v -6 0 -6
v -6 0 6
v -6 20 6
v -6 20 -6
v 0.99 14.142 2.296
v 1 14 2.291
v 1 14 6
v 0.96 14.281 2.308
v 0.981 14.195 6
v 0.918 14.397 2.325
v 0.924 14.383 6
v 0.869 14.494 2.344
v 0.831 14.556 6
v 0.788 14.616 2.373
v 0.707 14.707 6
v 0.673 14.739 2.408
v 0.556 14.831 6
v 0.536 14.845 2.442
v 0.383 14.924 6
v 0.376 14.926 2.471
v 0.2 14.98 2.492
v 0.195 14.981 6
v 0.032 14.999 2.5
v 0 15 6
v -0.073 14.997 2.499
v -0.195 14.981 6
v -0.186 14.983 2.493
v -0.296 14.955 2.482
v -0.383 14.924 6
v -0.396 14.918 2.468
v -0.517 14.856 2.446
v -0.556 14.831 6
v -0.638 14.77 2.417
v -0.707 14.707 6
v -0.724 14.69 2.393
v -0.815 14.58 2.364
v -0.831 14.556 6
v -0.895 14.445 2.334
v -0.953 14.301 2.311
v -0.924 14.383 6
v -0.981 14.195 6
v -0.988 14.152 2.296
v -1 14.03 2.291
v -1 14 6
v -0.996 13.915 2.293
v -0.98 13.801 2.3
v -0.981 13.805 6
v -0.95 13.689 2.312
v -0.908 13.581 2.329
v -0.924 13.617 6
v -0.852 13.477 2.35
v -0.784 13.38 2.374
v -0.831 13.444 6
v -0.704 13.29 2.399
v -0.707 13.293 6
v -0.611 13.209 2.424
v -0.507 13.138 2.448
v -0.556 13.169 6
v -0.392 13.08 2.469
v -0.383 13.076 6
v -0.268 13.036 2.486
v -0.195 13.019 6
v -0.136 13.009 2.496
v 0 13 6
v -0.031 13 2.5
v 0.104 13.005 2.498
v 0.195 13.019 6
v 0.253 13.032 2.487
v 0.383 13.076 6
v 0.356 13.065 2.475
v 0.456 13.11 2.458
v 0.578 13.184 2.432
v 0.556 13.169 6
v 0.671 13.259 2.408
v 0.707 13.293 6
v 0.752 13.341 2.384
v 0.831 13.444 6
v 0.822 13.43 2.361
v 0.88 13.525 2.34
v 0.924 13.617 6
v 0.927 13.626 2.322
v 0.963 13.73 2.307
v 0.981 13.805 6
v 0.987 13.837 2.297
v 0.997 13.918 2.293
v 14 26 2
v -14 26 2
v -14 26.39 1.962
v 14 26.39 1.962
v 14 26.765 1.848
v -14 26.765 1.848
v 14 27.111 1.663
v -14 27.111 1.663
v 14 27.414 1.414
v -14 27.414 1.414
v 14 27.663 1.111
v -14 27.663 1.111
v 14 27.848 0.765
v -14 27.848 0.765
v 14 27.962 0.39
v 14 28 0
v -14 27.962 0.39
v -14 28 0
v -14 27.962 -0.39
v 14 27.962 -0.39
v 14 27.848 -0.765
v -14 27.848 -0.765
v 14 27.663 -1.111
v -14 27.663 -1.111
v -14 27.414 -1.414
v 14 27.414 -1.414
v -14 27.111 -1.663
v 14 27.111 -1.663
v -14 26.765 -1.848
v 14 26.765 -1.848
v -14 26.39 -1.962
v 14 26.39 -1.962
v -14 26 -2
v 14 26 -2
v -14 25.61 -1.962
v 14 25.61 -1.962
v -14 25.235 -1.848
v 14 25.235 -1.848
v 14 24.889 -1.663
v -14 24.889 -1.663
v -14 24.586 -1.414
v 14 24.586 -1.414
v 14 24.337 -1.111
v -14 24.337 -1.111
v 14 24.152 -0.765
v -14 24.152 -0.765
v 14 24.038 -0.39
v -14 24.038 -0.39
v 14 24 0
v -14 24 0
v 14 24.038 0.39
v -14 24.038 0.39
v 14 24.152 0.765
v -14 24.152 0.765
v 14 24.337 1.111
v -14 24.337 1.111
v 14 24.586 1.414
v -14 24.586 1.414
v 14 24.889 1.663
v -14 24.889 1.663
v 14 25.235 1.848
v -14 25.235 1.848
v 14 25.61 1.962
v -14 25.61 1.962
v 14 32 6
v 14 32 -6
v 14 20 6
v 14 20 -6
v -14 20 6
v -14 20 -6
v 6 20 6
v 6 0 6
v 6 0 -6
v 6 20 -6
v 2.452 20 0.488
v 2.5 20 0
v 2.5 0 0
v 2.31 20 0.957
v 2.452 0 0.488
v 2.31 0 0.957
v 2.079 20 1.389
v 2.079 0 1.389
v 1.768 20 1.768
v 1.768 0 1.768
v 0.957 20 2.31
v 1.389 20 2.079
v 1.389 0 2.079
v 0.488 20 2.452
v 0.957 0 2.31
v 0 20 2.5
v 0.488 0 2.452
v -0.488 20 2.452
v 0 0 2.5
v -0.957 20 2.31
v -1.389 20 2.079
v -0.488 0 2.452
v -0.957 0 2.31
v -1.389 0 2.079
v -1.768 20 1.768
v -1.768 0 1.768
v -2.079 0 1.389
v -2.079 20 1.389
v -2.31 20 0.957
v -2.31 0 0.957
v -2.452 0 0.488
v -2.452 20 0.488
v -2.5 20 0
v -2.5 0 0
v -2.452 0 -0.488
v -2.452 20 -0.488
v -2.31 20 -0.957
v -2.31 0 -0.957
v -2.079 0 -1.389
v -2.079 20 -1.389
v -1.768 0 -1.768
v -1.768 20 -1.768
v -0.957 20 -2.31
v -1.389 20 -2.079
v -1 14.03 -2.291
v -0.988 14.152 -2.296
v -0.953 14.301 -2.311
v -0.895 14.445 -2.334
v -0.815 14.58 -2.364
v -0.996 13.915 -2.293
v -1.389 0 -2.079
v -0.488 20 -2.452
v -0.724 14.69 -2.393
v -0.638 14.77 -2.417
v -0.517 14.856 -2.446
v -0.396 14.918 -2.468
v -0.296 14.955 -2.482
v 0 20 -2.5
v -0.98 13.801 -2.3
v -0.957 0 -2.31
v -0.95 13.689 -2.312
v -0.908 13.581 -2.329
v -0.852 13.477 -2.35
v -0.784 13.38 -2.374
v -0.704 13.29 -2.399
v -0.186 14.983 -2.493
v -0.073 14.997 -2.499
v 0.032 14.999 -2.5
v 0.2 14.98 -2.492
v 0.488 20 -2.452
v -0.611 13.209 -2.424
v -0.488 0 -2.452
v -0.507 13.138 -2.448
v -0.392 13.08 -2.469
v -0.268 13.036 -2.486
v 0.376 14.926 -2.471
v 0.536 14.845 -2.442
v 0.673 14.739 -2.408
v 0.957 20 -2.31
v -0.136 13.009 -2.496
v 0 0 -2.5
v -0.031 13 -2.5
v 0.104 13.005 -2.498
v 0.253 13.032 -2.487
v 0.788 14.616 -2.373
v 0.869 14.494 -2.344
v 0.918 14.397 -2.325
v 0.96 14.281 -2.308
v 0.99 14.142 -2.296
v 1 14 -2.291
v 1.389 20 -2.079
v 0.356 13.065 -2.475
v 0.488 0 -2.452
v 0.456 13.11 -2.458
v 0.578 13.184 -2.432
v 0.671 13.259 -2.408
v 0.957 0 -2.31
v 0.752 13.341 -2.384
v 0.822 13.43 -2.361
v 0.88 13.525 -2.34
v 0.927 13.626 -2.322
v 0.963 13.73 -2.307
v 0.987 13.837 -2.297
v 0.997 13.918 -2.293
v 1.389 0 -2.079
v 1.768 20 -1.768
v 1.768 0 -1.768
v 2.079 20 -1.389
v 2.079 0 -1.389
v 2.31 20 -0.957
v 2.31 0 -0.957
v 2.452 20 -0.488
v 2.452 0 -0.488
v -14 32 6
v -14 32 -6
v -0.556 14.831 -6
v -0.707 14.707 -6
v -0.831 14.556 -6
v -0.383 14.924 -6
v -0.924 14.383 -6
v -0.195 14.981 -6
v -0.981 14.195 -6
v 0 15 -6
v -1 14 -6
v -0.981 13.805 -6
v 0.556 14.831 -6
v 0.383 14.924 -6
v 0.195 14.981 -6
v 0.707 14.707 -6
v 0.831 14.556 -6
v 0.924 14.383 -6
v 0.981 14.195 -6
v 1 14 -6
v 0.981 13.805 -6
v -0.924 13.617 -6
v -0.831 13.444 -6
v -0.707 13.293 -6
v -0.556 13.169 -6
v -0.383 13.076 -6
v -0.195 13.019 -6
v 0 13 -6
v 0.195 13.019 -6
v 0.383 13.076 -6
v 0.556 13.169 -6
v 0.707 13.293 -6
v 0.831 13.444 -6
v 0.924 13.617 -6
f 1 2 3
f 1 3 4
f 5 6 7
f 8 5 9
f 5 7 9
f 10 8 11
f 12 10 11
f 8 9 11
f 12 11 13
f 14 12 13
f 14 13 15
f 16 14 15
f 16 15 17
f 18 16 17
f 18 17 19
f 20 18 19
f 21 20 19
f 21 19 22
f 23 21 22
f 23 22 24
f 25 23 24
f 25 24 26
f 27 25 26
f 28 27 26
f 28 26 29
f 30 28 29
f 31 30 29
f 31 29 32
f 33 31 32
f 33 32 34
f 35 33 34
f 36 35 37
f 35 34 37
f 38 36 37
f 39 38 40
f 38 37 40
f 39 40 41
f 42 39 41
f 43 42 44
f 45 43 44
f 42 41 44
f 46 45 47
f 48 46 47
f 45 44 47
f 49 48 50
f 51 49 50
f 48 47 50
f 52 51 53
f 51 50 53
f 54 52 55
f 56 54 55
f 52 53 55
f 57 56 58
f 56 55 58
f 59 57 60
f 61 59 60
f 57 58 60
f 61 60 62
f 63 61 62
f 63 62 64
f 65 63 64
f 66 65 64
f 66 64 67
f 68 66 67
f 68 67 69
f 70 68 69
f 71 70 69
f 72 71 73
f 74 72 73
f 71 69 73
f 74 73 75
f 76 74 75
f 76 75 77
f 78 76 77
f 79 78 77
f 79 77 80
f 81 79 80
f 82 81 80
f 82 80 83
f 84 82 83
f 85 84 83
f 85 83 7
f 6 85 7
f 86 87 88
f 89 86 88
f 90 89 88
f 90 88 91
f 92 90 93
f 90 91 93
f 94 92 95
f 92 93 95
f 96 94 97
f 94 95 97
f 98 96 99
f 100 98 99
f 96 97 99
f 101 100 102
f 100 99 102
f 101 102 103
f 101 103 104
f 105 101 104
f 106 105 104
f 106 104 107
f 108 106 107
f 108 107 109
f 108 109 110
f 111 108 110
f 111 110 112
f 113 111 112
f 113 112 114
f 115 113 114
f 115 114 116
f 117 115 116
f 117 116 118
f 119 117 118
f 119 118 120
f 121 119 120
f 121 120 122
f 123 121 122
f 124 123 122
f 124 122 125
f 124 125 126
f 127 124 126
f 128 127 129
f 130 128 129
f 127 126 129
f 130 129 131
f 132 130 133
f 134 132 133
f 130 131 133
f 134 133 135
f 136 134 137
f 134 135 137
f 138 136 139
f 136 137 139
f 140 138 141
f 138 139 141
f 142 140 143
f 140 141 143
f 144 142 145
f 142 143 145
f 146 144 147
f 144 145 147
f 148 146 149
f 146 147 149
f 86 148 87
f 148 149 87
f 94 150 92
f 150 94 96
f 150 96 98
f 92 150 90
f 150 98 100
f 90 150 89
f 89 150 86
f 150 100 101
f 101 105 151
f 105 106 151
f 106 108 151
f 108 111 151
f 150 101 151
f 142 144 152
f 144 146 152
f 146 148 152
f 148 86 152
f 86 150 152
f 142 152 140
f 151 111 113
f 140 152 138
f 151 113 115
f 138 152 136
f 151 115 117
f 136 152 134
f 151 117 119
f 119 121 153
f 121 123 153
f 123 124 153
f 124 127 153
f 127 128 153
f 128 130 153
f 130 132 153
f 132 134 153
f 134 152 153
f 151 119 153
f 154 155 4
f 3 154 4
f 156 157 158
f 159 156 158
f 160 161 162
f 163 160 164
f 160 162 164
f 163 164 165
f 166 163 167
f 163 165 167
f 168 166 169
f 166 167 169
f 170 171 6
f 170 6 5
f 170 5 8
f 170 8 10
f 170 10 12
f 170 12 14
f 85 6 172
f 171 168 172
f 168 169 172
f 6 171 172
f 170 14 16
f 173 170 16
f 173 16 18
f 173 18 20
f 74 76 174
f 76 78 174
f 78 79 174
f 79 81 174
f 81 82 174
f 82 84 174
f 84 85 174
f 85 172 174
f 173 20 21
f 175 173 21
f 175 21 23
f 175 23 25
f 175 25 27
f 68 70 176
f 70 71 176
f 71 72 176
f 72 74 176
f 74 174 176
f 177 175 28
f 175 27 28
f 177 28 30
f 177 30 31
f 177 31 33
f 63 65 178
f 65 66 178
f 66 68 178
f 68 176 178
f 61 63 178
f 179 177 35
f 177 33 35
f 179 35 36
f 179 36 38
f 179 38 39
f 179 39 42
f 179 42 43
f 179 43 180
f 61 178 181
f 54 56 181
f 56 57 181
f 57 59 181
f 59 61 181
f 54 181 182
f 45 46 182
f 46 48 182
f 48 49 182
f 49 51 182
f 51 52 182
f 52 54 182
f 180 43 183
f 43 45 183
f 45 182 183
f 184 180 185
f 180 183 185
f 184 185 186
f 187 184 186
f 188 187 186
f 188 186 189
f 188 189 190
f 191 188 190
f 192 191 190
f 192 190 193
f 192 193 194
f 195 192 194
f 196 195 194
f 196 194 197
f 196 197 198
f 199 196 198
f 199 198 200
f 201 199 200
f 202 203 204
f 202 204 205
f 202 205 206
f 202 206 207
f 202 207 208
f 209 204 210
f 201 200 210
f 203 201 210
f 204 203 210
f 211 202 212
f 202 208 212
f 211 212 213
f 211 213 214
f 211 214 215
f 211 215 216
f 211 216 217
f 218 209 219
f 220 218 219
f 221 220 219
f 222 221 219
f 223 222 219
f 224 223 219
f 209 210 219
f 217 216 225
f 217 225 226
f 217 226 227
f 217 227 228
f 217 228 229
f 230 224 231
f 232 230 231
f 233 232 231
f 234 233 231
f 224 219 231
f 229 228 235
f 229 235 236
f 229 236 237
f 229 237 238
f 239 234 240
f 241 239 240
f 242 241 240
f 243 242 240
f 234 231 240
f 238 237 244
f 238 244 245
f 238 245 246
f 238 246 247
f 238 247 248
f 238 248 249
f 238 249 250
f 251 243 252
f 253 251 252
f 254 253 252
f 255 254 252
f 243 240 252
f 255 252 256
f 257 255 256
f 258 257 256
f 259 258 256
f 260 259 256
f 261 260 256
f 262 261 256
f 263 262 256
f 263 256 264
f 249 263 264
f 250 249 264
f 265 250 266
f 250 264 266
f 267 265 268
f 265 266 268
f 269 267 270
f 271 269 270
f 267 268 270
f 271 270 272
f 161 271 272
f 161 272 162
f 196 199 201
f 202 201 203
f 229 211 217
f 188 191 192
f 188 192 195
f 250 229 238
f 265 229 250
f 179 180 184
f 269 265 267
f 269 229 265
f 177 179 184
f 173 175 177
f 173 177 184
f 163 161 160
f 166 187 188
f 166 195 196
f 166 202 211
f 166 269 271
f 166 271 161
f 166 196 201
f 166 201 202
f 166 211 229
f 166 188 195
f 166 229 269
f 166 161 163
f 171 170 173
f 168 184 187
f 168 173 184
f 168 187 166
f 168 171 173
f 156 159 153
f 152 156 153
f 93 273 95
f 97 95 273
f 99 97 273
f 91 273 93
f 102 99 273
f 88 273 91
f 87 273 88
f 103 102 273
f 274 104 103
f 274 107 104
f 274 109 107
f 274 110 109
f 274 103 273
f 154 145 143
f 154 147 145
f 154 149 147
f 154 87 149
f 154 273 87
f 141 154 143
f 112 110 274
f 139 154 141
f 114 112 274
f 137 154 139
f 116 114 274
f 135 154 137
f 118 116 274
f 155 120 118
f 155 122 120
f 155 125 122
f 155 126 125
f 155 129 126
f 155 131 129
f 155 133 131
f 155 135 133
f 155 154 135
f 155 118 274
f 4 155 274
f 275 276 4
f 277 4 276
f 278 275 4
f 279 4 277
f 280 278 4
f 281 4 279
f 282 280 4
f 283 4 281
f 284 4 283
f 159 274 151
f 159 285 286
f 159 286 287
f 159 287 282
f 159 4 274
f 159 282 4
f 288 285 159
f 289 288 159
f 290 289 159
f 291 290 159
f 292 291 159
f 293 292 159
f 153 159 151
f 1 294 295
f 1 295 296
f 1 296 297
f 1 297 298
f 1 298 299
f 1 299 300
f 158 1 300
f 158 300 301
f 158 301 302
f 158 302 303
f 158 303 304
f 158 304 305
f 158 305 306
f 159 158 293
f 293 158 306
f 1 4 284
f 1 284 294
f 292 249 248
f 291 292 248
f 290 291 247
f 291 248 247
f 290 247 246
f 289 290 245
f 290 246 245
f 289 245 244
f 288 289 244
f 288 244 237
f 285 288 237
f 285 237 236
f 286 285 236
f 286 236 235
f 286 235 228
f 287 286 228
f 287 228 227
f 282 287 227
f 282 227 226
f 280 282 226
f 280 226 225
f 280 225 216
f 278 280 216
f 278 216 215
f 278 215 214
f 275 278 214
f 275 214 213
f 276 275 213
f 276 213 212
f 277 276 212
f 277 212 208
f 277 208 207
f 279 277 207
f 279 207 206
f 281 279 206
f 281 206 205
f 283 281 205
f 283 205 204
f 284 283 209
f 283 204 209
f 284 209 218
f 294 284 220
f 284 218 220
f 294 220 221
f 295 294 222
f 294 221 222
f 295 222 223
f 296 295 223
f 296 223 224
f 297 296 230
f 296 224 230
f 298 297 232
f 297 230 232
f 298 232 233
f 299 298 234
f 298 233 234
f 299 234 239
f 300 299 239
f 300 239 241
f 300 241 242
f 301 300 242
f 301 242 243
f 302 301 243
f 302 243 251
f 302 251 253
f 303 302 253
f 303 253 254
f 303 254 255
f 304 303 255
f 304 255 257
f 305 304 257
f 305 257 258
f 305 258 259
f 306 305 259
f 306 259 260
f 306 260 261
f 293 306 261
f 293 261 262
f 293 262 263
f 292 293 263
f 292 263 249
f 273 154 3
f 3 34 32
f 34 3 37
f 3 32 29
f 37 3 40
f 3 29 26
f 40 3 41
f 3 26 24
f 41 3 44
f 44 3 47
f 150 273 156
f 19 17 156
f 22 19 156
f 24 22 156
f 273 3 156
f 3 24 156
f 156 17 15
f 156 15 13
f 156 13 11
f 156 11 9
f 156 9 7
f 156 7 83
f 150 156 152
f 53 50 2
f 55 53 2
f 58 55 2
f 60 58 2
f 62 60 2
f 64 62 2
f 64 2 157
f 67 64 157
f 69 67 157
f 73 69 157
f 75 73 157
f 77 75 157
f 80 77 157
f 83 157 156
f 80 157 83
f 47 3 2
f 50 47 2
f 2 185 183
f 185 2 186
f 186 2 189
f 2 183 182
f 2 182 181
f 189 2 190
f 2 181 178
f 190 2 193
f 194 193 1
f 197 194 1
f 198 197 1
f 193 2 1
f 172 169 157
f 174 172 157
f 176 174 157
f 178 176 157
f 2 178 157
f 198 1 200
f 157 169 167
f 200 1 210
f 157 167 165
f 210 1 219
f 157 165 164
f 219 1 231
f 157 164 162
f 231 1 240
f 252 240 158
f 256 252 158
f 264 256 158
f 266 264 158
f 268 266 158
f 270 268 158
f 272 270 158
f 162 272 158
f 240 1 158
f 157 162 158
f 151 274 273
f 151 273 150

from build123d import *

# Parameters (mm, degrees)
SKETCH_1_W          = 12
SKETCH_1_H          = 12
EXTRUDE_1_DEPTH     = 20
SKETCH_2_W          = 28
SKETCH_2_H          = 12
EXTRUDE_2_DEPTH     = 12
SKETCH_3_R          = 2.5
CUT_EXTRUDE_1_DEPTH = 20
SKETCH_4_R          = 1
CUT_EXTRUDE_2_DEPTH = 13
SKETCH_5_R          = 2
CUT_EXTRUDE_3_DEPTH = 29


with BuildPart() as part:
    # Эскиз1 → Бобышка-Вытянуть1 (new body)
    with BuildSketch(Plane(origin=(0, 0, 0), x_dir=(1, 0, 0), z_dir=(0, 1, 0))):
        Rectangle(SKETCH_1_W, SKETCH_1_H)
    extrude(amount=EXTRUDE_1_DEPTH)

    # Эскиз2 → Бобышка-Вытянуть2 (add)
    with BuildSketch(Plane(origin=(0, 20, 0), x_dir=(1, 0, 0), z_dir=(0, 1, 0))):
        Rectangle(SKETCH_2_W, SKETCH_2_H)
    extrude(amount=EXTRUDE_2_DEPTH)

    # Эскиз3 → Вырез-Вытянуть1 (cut)
    with BuildSketch(Plane.XZ):
        Circle(SKETCH_3_R)
    extrude(amount=-CUT_EXTRUDE_1_DEPTH, mode=Mode.SUBTRACT)

    # Эскиз4 → Вырез-Вытянуть2 (cut, through all)
    with BuildSketch(Plane.XY.offset(6)):
        with Locations((0, 14)):
            Circle(SKETCH_4_R)
    extrude(amount=-CUT_EXTRUDE_2_DEPTH, mode=Mode.SUBTRACT)

    # Эскиз5 → Вырез-Вытянуть3 (cut, through all)
    with BuildSketch(Plane.ZY.offset(14)):
        with Locations((0, 26)):
            Circle(SKETCH_5_R)
    extrude(amount=-CUT_EXTRUDE_3_DEPTH, mode=Mode.SUBTRACT)


solid = part.part
